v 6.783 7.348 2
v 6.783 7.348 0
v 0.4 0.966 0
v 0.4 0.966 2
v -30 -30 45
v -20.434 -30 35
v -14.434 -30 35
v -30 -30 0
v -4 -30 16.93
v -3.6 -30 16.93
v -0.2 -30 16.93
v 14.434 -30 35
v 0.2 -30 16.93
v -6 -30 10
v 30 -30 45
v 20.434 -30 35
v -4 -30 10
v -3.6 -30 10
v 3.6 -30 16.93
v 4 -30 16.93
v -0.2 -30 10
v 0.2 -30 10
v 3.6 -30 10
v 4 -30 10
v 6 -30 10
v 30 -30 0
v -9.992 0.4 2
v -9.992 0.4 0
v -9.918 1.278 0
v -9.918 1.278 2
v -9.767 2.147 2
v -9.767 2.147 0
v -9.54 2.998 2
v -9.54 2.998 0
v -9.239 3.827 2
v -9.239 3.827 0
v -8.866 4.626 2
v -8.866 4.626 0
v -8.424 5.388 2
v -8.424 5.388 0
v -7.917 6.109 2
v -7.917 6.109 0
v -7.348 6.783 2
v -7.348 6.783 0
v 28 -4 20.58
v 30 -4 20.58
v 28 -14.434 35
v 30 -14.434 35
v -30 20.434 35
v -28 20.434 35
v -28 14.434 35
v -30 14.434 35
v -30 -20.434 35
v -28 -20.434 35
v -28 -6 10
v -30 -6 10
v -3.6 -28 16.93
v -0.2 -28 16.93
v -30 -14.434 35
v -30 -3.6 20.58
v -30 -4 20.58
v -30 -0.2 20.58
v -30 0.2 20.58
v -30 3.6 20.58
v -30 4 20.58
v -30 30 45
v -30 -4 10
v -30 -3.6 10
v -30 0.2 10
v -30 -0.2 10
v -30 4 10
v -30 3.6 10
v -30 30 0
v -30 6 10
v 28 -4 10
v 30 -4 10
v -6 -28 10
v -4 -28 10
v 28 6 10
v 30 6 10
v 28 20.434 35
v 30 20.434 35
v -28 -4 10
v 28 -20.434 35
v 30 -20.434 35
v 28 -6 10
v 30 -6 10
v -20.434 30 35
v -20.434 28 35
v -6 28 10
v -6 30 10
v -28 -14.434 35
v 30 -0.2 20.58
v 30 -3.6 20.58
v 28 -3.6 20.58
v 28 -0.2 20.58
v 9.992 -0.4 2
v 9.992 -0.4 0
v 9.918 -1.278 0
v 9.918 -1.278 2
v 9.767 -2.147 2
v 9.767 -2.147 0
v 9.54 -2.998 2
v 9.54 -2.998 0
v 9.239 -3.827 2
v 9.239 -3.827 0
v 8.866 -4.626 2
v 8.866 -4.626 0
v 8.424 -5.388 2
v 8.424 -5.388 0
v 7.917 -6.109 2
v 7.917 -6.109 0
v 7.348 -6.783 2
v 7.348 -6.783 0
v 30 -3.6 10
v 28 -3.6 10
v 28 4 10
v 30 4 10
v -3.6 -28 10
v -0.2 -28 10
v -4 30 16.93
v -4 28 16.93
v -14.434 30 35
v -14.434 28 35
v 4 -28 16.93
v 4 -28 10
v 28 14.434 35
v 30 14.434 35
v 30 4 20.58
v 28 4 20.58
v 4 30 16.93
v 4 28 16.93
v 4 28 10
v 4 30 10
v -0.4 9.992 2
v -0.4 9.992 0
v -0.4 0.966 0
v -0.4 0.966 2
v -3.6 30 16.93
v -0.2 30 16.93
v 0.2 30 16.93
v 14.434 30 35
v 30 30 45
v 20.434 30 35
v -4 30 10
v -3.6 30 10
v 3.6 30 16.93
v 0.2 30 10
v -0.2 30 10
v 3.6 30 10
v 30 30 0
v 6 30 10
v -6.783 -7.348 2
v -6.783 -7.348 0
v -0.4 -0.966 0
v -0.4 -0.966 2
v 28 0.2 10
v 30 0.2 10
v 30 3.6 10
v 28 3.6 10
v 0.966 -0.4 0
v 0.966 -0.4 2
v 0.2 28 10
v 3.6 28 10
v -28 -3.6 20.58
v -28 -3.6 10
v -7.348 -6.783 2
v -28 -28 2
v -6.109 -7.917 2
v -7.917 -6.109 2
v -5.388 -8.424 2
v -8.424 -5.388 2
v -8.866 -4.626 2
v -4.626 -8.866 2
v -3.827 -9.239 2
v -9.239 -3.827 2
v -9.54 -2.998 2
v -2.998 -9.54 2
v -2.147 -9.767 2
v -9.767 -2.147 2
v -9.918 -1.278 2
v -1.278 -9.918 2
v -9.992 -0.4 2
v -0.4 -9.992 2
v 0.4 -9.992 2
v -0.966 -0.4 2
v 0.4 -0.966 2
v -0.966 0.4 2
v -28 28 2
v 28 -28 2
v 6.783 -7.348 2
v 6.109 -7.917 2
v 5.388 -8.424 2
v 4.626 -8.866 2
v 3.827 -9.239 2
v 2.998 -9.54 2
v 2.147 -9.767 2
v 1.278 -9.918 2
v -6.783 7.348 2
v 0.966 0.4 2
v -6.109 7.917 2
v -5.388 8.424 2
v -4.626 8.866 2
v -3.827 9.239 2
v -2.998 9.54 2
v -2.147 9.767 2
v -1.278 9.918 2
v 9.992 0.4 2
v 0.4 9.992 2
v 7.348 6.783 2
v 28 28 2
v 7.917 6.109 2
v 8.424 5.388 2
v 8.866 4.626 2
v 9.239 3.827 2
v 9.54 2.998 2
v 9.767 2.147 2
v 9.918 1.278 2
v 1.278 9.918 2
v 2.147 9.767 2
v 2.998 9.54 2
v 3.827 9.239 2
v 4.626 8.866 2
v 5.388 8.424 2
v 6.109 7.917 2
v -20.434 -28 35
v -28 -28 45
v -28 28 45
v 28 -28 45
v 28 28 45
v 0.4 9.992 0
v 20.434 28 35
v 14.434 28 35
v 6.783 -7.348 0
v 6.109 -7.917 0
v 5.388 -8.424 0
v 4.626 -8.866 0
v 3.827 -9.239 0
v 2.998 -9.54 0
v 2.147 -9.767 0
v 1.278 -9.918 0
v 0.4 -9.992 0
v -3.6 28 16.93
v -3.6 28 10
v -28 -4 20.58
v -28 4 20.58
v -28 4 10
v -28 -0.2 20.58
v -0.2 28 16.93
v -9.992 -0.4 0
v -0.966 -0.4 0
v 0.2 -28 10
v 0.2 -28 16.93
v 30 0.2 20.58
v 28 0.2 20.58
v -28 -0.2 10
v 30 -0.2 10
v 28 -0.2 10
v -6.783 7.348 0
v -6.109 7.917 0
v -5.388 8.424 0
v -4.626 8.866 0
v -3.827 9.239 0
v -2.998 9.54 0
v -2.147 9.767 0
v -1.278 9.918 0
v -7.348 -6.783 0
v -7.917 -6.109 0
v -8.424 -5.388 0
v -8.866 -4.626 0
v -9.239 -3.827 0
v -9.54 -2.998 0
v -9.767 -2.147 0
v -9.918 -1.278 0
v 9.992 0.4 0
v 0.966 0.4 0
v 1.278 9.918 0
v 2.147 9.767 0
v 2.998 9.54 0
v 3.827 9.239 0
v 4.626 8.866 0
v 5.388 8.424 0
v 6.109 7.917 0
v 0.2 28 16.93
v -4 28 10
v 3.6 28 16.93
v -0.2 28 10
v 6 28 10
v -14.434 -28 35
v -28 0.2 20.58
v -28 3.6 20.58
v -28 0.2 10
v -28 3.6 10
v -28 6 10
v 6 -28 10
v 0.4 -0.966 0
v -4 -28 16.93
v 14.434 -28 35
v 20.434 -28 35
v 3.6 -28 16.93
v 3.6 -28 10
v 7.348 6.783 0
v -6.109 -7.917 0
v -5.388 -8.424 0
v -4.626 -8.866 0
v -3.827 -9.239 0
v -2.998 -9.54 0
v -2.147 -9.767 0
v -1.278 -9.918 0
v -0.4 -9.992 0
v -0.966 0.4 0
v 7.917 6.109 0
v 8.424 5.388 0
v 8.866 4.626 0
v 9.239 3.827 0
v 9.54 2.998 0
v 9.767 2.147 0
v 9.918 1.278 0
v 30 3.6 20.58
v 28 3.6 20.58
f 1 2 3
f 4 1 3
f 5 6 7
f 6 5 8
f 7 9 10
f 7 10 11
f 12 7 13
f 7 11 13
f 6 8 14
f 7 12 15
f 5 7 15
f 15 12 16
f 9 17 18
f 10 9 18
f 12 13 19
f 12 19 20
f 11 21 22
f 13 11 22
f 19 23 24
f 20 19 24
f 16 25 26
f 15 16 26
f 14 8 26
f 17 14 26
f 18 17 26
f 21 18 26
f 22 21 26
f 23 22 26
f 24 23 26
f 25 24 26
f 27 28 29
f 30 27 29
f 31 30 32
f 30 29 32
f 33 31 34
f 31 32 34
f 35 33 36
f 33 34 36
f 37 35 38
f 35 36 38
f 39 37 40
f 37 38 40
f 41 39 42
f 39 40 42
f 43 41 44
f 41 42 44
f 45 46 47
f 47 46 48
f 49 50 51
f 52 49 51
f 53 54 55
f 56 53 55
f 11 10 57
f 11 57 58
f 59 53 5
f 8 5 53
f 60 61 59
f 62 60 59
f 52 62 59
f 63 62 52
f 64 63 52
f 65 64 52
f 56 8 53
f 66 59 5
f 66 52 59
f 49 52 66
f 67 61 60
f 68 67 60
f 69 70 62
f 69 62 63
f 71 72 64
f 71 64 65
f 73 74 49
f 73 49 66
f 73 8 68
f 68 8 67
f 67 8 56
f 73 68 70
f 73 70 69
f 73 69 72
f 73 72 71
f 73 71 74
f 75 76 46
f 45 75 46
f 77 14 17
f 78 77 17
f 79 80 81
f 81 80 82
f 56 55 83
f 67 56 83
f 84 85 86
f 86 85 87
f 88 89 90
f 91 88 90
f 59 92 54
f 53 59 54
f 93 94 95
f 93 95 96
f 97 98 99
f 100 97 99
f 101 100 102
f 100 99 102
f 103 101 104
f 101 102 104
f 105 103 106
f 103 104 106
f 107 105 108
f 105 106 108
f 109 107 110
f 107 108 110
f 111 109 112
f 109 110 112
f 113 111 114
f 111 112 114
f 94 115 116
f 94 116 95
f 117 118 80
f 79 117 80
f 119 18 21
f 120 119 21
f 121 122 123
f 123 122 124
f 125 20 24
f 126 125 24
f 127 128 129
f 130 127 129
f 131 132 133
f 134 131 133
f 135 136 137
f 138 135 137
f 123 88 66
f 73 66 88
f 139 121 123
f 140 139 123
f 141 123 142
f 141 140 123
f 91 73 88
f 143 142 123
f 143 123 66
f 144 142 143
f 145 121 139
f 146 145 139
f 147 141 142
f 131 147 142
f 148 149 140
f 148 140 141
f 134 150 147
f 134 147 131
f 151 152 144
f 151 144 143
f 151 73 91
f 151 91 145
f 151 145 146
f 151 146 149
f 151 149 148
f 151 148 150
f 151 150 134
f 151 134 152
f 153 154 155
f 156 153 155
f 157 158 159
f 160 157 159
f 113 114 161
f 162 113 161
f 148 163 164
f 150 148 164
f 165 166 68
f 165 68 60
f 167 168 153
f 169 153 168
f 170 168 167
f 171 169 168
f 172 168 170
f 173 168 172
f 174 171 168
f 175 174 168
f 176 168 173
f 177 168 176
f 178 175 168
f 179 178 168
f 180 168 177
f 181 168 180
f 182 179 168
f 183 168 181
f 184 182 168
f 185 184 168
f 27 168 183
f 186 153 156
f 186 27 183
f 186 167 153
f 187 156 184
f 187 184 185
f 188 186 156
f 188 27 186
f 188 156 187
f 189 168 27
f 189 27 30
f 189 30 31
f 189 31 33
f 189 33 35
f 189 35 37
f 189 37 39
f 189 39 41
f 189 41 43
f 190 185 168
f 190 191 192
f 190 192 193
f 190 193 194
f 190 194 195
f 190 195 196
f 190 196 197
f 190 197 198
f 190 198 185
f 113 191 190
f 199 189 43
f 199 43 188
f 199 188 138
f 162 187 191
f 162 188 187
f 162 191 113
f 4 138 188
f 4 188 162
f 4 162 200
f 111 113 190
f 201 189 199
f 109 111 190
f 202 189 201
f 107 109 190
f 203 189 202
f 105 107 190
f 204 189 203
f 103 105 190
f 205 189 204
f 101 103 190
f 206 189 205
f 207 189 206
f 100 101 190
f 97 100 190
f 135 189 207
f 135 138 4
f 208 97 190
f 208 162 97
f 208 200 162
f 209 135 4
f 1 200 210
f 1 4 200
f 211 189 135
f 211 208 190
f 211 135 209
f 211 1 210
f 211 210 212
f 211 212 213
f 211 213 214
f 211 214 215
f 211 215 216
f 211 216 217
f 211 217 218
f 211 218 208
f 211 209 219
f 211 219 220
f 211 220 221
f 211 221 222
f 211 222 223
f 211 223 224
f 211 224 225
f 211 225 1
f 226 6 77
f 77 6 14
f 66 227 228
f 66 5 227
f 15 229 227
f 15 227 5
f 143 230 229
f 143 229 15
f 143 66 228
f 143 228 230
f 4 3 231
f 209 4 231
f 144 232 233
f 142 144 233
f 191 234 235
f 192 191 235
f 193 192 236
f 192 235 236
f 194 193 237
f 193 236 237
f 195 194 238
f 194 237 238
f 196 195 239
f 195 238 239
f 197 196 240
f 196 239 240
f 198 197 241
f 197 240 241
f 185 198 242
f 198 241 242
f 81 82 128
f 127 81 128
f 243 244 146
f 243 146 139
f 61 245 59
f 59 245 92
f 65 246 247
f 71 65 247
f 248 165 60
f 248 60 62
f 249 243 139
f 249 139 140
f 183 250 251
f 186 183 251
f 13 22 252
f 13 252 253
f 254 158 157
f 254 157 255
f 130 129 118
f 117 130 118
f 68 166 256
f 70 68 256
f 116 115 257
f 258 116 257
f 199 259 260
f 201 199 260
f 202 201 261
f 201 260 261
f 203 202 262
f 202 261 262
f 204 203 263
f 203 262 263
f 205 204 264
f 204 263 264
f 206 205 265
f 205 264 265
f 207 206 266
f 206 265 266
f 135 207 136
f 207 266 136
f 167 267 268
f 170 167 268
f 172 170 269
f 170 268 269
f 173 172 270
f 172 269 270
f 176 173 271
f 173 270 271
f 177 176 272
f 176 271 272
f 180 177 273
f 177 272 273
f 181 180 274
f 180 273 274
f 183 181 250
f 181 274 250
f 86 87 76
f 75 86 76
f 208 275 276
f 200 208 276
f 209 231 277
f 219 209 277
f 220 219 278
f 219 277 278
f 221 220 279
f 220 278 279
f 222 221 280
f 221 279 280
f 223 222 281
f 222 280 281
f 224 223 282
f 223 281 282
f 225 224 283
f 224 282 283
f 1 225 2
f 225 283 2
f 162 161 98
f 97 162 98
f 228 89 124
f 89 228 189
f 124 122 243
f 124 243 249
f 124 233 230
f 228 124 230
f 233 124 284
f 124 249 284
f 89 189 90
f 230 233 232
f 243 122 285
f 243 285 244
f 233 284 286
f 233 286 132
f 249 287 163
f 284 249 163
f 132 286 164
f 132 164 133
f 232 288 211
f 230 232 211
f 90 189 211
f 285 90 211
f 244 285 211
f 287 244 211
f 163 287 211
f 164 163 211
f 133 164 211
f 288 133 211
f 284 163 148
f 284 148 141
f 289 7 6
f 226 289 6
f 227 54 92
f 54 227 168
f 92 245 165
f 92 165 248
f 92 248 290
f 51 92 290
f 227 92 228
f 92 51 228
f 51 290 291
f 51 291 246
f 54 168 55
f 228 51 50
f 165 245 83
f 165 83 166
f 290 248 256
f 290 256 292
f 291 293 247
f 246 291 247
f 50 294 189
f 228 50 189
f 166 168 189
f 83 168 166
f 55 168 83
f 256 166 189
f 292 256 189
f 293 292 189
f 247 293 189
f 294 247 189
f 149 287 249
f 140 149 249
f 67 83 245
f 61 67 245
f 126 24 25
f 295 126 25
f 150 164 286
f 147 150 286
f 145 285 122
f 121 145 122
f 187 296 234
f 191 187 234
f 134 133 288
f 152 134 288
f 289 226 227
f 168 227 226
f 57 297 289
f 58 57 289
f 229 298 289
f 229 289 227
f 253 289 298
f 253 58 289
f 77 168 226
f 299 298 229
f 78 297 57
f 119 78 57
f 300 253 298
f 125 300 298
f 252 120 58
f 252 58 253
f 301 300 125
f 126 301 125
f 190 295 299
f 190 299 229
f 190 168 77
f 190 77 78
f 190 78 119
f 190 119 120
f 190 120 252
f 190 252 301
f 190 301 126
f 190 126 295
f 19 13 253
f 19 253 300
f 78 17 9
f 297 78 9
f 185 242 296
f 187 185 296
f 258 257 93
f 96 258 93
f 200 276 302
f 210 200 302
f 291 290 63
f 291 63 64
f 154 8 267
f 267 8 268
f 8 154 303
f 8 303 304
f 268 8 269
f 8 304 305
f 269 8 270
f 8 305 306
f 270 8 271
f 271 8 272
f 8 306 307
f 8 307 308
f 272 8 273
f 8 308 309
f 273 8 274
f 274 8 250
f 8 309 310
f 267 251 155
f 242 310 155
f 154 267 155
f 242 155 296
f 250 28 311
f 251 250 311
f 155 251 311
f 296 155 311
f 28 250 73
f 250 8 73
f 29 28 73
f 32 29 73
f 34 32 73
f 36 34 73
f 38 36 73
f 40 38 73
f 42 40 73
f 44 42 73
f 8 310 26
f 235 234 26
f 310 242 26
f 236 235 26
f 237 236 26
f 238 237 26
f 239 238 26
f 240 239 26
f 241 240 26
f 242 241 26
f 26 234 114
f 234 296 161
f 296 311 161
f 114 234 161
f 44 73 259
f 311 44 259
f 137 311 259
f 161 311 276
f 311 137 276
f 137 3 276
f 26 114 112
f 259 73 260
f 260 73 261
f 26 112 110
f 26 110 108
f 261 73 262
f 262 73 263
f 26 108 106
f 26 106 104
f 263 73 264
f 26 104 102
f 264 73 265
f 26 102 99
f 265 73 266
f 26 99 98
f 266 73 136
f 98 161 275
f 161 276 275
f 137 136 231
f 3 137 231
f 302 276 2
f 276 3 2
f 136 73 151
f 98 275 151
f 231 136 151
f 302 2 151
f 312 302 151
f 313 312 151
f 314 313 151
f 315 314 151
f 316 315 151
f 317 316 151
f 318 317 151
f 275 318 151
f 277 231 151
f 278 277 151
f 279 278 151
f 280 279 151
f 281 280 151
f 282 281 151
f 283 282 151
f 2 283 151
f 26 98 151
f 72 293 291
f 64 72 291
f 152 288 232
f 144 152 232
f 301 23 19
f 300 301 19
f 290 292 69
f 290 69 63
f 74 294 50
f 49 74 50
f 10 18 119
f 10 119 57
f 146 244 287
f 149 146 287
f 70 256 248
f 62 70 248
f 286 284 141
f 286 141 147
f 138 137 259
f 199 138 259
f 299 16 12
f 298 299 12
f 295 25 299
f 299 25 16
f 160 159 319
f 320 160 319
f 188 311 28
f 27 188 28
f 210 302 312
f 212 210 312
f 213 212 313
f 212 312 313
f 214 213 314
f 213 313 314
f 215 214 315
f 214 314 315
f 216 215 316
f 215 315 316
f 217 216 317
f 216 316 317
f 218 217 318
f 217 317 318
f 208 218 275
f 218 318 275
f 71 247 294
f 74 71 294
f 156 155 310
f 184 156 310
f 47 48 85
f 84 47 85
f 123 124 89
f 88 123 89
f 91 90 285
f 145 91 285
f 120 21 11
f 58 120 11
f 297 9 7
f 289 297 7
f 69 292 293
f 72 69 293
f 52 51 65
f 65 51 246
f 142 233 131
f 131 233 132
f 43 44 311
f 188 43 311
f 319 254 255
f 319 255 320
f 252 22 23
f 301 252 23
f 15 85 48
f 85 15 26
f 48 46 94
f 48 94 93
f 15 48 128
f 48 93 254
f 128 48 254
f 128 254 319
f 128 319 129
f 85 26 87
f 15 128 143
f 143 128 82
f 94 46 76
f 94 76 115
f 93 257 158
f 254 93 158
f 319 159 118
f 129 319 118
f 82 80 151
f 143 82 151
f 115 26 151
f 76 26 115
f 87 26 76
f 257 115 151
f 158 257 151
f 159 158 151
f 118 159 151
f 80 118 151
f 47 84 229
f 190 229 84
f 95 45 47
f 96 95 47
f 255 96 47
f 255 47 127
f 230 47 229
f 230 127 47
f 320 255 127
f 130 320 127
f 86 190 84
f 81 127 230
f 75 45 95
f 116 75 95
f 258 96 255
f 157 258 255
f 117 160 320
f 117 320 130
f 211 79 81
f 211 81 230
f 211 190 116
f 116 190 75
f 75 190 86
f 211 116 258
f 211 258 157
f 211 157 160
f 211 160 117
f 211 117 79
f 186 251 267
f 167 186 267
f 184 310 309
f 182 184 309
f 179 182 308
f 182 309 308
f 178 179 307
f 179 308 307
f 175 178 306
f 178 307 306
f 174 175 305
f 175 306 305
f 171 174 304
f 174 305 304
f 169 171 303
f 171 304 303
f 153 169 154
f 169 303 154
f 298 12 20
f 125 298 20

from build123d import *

# Parameters (mm, degrees)
F0_W     = 60
F0_H     = 60
F1_DEPTH = 45
F2_T     = -2
F3_W     = 3.4
F3_H     = 6.9295717942
F4_DEPTH = 64.2
F5_W     = 3.4
F5_H     = 10.5797095255
F6_DEPTH = 63.5
F8_DEPTH = 25


# Not quite as in the source:
# - a feature names something its author has since deleted; it is built from what else it names


with BuildPart() as f1:
    # F0 (on Top) → F1 (new body)
    with BuildSketch(Plane.XY):
        Rectangle(F0_W, F0_H)
    extrude(amount=F1_DEPTH)

    # F2
    f2_openings = [f1.faces().sort_by_distance(p)[0] for p in [
        (0, 0, 45),
    ]]
    offset(amount=F2_T, openings=f2_openings)

    # F3 (on face) → F4 (cut)
    with BuildSketch(Plane.XZ.offset(30)):
        Polygon((-20.4337567297, 35), (-6, 10), (-4, 10), (-4, 16.9295717942), (-14.4337567297, 35), align=None)
        with Locations((-1.9, 13.4647858971)):
            Rectangle(F3_W, F3_H)
        with Locations((1.9, 13.4647858971)):
            Rectangle(F3_W, F3_H)
        Polygon((4, 16.9295717942), (4, 10), (6, 10), (20.4337567297, 35), (14.4337567297, 35), align=None)
    extrude(amount=-F4_DEPTH, mode=Mode.SUBTRACT)

    # F5 (on face) → F6 (cut)
    with BuildSketch(Plane.YZ.offset(30)):
        Polygon((-20.4337567297, 35), (-6, 10), (-4, 10), (-4, 20.5797095255), (-14.4337567297, 35), align=None)
        with Locations((-1.9, 15.2898547627)):
            Rectangle(F5_W, F5_H)
        with Locations((1.9, 15.2898547627)):
            Rectangle(F5_W, F5_H)
        Polygon((4, 20.5797095255), (4, 10), (6, 10), (20.4337567297, 35), (14.4337567297, 35), align=None)
    extrude(amount=-F6_DEPTH, mode=Mode.SUBTRACT)

    # F7 (on face) → F8 (cut)
    with BuildSketch(Plane(origin=(0, 0, 0), x_dir=(1, 0, 0), z_dir=(0, 0, -1))):
        with BuildLine():
            Line((0.9656854249, 0.4), (9.9919967974, 0.4))
            ThreePointArc((9.9919967974, 0.4), (9.2387953251, 3.8268343237), (7.3482514055, 6.7825659806))
            Line((7.3482514055, 6.7825659806), (0.9656854249, 0.4))
        make_face()
        with BuildLine():
            ThreePointArc((7.3482514055, -6.7825659806), (9.2387953251, -3.8268343237), (9.9919967974, -0.4))
            Line((9.9919967974, -0.4), (0.9656854249, -0.4))
            Line((0.9656854249, -0.4), (7.3482514055, -6.7825659806))
        make_face()
        with BuildLine():
            Line((0.4, 0.9656854249), (6.7825659806, 7.3482514055))
            ThreePointArc((6.7825659806, 7.3482514055), (3.8268343237, 9.2387953251), (0.4, 9.9919967974))
            Line((0.4, 9.9919967974), (0.4, 0.9656854249))
        make_face()
        with BuildLine():
            ThreePointArc((0.4, -9.9919967974), (3.8268343237, -9.2387953251), (6.7825659806, -7.3482514055))
            Line((6.7825659806, -7.3482514055), (0.4, -0.9656854249))
            Line((0.4, -0.9656854249), (0.4, -9.9919967974))
        make_face()
        with BuildLine():
            Line((-6.7825659806, 7.3482514055), (-0.4, 0.9656854249))
            Line((-0.4, 0.9656854249), (-0.4, 9.9919967974))
            ThreePointArc((-0.4, 9.9919967974), (-3.8268343237, 9.2387953251), (-6.7825659806, 7.3482514055))
        make_face()
        with BuildLine():
            Line((-0.4, -9.9919967974), (-0.4, -0.9656854249))
            Line((-0.4, -0.9656854249), (-6.7825659806, -7.3482514055))
            ThreePointArc((-6.7825659806, -7.3482514055), (-3.8268343237, -9.2387953251), (-0.4, -9.9919967974))
        make_face()
        with BuildLine():
            Line((-7.3482514055, -6.7825659806), (-0.9656854249, -0.4))
            Line((-0.9656854249, -0.4), (-9.9919967974, -0.4))
            ThreePointArc((-9.9919967974, -0.4), (-9.2387953251, -3.8268343237), (-7.3482514055, -6.7825659806))
        make_face()
        with BuildLine():
            Line((-9.9919967974, 0.4), (-0.9656854249, 0.4))
            Line((-0.9656854249, 0.4), (-7.3482514055, 6.7825659806))
            ThreePointArc((-7.3482514055, 6.7825659806), (-9.2387953251, 3.8268343237), (-9.9919967974, 0.4))
        make_face()
    extrude(amount=-F8_DEPTH, mode=Mode.SUBTRACT)


solid = f1.part
